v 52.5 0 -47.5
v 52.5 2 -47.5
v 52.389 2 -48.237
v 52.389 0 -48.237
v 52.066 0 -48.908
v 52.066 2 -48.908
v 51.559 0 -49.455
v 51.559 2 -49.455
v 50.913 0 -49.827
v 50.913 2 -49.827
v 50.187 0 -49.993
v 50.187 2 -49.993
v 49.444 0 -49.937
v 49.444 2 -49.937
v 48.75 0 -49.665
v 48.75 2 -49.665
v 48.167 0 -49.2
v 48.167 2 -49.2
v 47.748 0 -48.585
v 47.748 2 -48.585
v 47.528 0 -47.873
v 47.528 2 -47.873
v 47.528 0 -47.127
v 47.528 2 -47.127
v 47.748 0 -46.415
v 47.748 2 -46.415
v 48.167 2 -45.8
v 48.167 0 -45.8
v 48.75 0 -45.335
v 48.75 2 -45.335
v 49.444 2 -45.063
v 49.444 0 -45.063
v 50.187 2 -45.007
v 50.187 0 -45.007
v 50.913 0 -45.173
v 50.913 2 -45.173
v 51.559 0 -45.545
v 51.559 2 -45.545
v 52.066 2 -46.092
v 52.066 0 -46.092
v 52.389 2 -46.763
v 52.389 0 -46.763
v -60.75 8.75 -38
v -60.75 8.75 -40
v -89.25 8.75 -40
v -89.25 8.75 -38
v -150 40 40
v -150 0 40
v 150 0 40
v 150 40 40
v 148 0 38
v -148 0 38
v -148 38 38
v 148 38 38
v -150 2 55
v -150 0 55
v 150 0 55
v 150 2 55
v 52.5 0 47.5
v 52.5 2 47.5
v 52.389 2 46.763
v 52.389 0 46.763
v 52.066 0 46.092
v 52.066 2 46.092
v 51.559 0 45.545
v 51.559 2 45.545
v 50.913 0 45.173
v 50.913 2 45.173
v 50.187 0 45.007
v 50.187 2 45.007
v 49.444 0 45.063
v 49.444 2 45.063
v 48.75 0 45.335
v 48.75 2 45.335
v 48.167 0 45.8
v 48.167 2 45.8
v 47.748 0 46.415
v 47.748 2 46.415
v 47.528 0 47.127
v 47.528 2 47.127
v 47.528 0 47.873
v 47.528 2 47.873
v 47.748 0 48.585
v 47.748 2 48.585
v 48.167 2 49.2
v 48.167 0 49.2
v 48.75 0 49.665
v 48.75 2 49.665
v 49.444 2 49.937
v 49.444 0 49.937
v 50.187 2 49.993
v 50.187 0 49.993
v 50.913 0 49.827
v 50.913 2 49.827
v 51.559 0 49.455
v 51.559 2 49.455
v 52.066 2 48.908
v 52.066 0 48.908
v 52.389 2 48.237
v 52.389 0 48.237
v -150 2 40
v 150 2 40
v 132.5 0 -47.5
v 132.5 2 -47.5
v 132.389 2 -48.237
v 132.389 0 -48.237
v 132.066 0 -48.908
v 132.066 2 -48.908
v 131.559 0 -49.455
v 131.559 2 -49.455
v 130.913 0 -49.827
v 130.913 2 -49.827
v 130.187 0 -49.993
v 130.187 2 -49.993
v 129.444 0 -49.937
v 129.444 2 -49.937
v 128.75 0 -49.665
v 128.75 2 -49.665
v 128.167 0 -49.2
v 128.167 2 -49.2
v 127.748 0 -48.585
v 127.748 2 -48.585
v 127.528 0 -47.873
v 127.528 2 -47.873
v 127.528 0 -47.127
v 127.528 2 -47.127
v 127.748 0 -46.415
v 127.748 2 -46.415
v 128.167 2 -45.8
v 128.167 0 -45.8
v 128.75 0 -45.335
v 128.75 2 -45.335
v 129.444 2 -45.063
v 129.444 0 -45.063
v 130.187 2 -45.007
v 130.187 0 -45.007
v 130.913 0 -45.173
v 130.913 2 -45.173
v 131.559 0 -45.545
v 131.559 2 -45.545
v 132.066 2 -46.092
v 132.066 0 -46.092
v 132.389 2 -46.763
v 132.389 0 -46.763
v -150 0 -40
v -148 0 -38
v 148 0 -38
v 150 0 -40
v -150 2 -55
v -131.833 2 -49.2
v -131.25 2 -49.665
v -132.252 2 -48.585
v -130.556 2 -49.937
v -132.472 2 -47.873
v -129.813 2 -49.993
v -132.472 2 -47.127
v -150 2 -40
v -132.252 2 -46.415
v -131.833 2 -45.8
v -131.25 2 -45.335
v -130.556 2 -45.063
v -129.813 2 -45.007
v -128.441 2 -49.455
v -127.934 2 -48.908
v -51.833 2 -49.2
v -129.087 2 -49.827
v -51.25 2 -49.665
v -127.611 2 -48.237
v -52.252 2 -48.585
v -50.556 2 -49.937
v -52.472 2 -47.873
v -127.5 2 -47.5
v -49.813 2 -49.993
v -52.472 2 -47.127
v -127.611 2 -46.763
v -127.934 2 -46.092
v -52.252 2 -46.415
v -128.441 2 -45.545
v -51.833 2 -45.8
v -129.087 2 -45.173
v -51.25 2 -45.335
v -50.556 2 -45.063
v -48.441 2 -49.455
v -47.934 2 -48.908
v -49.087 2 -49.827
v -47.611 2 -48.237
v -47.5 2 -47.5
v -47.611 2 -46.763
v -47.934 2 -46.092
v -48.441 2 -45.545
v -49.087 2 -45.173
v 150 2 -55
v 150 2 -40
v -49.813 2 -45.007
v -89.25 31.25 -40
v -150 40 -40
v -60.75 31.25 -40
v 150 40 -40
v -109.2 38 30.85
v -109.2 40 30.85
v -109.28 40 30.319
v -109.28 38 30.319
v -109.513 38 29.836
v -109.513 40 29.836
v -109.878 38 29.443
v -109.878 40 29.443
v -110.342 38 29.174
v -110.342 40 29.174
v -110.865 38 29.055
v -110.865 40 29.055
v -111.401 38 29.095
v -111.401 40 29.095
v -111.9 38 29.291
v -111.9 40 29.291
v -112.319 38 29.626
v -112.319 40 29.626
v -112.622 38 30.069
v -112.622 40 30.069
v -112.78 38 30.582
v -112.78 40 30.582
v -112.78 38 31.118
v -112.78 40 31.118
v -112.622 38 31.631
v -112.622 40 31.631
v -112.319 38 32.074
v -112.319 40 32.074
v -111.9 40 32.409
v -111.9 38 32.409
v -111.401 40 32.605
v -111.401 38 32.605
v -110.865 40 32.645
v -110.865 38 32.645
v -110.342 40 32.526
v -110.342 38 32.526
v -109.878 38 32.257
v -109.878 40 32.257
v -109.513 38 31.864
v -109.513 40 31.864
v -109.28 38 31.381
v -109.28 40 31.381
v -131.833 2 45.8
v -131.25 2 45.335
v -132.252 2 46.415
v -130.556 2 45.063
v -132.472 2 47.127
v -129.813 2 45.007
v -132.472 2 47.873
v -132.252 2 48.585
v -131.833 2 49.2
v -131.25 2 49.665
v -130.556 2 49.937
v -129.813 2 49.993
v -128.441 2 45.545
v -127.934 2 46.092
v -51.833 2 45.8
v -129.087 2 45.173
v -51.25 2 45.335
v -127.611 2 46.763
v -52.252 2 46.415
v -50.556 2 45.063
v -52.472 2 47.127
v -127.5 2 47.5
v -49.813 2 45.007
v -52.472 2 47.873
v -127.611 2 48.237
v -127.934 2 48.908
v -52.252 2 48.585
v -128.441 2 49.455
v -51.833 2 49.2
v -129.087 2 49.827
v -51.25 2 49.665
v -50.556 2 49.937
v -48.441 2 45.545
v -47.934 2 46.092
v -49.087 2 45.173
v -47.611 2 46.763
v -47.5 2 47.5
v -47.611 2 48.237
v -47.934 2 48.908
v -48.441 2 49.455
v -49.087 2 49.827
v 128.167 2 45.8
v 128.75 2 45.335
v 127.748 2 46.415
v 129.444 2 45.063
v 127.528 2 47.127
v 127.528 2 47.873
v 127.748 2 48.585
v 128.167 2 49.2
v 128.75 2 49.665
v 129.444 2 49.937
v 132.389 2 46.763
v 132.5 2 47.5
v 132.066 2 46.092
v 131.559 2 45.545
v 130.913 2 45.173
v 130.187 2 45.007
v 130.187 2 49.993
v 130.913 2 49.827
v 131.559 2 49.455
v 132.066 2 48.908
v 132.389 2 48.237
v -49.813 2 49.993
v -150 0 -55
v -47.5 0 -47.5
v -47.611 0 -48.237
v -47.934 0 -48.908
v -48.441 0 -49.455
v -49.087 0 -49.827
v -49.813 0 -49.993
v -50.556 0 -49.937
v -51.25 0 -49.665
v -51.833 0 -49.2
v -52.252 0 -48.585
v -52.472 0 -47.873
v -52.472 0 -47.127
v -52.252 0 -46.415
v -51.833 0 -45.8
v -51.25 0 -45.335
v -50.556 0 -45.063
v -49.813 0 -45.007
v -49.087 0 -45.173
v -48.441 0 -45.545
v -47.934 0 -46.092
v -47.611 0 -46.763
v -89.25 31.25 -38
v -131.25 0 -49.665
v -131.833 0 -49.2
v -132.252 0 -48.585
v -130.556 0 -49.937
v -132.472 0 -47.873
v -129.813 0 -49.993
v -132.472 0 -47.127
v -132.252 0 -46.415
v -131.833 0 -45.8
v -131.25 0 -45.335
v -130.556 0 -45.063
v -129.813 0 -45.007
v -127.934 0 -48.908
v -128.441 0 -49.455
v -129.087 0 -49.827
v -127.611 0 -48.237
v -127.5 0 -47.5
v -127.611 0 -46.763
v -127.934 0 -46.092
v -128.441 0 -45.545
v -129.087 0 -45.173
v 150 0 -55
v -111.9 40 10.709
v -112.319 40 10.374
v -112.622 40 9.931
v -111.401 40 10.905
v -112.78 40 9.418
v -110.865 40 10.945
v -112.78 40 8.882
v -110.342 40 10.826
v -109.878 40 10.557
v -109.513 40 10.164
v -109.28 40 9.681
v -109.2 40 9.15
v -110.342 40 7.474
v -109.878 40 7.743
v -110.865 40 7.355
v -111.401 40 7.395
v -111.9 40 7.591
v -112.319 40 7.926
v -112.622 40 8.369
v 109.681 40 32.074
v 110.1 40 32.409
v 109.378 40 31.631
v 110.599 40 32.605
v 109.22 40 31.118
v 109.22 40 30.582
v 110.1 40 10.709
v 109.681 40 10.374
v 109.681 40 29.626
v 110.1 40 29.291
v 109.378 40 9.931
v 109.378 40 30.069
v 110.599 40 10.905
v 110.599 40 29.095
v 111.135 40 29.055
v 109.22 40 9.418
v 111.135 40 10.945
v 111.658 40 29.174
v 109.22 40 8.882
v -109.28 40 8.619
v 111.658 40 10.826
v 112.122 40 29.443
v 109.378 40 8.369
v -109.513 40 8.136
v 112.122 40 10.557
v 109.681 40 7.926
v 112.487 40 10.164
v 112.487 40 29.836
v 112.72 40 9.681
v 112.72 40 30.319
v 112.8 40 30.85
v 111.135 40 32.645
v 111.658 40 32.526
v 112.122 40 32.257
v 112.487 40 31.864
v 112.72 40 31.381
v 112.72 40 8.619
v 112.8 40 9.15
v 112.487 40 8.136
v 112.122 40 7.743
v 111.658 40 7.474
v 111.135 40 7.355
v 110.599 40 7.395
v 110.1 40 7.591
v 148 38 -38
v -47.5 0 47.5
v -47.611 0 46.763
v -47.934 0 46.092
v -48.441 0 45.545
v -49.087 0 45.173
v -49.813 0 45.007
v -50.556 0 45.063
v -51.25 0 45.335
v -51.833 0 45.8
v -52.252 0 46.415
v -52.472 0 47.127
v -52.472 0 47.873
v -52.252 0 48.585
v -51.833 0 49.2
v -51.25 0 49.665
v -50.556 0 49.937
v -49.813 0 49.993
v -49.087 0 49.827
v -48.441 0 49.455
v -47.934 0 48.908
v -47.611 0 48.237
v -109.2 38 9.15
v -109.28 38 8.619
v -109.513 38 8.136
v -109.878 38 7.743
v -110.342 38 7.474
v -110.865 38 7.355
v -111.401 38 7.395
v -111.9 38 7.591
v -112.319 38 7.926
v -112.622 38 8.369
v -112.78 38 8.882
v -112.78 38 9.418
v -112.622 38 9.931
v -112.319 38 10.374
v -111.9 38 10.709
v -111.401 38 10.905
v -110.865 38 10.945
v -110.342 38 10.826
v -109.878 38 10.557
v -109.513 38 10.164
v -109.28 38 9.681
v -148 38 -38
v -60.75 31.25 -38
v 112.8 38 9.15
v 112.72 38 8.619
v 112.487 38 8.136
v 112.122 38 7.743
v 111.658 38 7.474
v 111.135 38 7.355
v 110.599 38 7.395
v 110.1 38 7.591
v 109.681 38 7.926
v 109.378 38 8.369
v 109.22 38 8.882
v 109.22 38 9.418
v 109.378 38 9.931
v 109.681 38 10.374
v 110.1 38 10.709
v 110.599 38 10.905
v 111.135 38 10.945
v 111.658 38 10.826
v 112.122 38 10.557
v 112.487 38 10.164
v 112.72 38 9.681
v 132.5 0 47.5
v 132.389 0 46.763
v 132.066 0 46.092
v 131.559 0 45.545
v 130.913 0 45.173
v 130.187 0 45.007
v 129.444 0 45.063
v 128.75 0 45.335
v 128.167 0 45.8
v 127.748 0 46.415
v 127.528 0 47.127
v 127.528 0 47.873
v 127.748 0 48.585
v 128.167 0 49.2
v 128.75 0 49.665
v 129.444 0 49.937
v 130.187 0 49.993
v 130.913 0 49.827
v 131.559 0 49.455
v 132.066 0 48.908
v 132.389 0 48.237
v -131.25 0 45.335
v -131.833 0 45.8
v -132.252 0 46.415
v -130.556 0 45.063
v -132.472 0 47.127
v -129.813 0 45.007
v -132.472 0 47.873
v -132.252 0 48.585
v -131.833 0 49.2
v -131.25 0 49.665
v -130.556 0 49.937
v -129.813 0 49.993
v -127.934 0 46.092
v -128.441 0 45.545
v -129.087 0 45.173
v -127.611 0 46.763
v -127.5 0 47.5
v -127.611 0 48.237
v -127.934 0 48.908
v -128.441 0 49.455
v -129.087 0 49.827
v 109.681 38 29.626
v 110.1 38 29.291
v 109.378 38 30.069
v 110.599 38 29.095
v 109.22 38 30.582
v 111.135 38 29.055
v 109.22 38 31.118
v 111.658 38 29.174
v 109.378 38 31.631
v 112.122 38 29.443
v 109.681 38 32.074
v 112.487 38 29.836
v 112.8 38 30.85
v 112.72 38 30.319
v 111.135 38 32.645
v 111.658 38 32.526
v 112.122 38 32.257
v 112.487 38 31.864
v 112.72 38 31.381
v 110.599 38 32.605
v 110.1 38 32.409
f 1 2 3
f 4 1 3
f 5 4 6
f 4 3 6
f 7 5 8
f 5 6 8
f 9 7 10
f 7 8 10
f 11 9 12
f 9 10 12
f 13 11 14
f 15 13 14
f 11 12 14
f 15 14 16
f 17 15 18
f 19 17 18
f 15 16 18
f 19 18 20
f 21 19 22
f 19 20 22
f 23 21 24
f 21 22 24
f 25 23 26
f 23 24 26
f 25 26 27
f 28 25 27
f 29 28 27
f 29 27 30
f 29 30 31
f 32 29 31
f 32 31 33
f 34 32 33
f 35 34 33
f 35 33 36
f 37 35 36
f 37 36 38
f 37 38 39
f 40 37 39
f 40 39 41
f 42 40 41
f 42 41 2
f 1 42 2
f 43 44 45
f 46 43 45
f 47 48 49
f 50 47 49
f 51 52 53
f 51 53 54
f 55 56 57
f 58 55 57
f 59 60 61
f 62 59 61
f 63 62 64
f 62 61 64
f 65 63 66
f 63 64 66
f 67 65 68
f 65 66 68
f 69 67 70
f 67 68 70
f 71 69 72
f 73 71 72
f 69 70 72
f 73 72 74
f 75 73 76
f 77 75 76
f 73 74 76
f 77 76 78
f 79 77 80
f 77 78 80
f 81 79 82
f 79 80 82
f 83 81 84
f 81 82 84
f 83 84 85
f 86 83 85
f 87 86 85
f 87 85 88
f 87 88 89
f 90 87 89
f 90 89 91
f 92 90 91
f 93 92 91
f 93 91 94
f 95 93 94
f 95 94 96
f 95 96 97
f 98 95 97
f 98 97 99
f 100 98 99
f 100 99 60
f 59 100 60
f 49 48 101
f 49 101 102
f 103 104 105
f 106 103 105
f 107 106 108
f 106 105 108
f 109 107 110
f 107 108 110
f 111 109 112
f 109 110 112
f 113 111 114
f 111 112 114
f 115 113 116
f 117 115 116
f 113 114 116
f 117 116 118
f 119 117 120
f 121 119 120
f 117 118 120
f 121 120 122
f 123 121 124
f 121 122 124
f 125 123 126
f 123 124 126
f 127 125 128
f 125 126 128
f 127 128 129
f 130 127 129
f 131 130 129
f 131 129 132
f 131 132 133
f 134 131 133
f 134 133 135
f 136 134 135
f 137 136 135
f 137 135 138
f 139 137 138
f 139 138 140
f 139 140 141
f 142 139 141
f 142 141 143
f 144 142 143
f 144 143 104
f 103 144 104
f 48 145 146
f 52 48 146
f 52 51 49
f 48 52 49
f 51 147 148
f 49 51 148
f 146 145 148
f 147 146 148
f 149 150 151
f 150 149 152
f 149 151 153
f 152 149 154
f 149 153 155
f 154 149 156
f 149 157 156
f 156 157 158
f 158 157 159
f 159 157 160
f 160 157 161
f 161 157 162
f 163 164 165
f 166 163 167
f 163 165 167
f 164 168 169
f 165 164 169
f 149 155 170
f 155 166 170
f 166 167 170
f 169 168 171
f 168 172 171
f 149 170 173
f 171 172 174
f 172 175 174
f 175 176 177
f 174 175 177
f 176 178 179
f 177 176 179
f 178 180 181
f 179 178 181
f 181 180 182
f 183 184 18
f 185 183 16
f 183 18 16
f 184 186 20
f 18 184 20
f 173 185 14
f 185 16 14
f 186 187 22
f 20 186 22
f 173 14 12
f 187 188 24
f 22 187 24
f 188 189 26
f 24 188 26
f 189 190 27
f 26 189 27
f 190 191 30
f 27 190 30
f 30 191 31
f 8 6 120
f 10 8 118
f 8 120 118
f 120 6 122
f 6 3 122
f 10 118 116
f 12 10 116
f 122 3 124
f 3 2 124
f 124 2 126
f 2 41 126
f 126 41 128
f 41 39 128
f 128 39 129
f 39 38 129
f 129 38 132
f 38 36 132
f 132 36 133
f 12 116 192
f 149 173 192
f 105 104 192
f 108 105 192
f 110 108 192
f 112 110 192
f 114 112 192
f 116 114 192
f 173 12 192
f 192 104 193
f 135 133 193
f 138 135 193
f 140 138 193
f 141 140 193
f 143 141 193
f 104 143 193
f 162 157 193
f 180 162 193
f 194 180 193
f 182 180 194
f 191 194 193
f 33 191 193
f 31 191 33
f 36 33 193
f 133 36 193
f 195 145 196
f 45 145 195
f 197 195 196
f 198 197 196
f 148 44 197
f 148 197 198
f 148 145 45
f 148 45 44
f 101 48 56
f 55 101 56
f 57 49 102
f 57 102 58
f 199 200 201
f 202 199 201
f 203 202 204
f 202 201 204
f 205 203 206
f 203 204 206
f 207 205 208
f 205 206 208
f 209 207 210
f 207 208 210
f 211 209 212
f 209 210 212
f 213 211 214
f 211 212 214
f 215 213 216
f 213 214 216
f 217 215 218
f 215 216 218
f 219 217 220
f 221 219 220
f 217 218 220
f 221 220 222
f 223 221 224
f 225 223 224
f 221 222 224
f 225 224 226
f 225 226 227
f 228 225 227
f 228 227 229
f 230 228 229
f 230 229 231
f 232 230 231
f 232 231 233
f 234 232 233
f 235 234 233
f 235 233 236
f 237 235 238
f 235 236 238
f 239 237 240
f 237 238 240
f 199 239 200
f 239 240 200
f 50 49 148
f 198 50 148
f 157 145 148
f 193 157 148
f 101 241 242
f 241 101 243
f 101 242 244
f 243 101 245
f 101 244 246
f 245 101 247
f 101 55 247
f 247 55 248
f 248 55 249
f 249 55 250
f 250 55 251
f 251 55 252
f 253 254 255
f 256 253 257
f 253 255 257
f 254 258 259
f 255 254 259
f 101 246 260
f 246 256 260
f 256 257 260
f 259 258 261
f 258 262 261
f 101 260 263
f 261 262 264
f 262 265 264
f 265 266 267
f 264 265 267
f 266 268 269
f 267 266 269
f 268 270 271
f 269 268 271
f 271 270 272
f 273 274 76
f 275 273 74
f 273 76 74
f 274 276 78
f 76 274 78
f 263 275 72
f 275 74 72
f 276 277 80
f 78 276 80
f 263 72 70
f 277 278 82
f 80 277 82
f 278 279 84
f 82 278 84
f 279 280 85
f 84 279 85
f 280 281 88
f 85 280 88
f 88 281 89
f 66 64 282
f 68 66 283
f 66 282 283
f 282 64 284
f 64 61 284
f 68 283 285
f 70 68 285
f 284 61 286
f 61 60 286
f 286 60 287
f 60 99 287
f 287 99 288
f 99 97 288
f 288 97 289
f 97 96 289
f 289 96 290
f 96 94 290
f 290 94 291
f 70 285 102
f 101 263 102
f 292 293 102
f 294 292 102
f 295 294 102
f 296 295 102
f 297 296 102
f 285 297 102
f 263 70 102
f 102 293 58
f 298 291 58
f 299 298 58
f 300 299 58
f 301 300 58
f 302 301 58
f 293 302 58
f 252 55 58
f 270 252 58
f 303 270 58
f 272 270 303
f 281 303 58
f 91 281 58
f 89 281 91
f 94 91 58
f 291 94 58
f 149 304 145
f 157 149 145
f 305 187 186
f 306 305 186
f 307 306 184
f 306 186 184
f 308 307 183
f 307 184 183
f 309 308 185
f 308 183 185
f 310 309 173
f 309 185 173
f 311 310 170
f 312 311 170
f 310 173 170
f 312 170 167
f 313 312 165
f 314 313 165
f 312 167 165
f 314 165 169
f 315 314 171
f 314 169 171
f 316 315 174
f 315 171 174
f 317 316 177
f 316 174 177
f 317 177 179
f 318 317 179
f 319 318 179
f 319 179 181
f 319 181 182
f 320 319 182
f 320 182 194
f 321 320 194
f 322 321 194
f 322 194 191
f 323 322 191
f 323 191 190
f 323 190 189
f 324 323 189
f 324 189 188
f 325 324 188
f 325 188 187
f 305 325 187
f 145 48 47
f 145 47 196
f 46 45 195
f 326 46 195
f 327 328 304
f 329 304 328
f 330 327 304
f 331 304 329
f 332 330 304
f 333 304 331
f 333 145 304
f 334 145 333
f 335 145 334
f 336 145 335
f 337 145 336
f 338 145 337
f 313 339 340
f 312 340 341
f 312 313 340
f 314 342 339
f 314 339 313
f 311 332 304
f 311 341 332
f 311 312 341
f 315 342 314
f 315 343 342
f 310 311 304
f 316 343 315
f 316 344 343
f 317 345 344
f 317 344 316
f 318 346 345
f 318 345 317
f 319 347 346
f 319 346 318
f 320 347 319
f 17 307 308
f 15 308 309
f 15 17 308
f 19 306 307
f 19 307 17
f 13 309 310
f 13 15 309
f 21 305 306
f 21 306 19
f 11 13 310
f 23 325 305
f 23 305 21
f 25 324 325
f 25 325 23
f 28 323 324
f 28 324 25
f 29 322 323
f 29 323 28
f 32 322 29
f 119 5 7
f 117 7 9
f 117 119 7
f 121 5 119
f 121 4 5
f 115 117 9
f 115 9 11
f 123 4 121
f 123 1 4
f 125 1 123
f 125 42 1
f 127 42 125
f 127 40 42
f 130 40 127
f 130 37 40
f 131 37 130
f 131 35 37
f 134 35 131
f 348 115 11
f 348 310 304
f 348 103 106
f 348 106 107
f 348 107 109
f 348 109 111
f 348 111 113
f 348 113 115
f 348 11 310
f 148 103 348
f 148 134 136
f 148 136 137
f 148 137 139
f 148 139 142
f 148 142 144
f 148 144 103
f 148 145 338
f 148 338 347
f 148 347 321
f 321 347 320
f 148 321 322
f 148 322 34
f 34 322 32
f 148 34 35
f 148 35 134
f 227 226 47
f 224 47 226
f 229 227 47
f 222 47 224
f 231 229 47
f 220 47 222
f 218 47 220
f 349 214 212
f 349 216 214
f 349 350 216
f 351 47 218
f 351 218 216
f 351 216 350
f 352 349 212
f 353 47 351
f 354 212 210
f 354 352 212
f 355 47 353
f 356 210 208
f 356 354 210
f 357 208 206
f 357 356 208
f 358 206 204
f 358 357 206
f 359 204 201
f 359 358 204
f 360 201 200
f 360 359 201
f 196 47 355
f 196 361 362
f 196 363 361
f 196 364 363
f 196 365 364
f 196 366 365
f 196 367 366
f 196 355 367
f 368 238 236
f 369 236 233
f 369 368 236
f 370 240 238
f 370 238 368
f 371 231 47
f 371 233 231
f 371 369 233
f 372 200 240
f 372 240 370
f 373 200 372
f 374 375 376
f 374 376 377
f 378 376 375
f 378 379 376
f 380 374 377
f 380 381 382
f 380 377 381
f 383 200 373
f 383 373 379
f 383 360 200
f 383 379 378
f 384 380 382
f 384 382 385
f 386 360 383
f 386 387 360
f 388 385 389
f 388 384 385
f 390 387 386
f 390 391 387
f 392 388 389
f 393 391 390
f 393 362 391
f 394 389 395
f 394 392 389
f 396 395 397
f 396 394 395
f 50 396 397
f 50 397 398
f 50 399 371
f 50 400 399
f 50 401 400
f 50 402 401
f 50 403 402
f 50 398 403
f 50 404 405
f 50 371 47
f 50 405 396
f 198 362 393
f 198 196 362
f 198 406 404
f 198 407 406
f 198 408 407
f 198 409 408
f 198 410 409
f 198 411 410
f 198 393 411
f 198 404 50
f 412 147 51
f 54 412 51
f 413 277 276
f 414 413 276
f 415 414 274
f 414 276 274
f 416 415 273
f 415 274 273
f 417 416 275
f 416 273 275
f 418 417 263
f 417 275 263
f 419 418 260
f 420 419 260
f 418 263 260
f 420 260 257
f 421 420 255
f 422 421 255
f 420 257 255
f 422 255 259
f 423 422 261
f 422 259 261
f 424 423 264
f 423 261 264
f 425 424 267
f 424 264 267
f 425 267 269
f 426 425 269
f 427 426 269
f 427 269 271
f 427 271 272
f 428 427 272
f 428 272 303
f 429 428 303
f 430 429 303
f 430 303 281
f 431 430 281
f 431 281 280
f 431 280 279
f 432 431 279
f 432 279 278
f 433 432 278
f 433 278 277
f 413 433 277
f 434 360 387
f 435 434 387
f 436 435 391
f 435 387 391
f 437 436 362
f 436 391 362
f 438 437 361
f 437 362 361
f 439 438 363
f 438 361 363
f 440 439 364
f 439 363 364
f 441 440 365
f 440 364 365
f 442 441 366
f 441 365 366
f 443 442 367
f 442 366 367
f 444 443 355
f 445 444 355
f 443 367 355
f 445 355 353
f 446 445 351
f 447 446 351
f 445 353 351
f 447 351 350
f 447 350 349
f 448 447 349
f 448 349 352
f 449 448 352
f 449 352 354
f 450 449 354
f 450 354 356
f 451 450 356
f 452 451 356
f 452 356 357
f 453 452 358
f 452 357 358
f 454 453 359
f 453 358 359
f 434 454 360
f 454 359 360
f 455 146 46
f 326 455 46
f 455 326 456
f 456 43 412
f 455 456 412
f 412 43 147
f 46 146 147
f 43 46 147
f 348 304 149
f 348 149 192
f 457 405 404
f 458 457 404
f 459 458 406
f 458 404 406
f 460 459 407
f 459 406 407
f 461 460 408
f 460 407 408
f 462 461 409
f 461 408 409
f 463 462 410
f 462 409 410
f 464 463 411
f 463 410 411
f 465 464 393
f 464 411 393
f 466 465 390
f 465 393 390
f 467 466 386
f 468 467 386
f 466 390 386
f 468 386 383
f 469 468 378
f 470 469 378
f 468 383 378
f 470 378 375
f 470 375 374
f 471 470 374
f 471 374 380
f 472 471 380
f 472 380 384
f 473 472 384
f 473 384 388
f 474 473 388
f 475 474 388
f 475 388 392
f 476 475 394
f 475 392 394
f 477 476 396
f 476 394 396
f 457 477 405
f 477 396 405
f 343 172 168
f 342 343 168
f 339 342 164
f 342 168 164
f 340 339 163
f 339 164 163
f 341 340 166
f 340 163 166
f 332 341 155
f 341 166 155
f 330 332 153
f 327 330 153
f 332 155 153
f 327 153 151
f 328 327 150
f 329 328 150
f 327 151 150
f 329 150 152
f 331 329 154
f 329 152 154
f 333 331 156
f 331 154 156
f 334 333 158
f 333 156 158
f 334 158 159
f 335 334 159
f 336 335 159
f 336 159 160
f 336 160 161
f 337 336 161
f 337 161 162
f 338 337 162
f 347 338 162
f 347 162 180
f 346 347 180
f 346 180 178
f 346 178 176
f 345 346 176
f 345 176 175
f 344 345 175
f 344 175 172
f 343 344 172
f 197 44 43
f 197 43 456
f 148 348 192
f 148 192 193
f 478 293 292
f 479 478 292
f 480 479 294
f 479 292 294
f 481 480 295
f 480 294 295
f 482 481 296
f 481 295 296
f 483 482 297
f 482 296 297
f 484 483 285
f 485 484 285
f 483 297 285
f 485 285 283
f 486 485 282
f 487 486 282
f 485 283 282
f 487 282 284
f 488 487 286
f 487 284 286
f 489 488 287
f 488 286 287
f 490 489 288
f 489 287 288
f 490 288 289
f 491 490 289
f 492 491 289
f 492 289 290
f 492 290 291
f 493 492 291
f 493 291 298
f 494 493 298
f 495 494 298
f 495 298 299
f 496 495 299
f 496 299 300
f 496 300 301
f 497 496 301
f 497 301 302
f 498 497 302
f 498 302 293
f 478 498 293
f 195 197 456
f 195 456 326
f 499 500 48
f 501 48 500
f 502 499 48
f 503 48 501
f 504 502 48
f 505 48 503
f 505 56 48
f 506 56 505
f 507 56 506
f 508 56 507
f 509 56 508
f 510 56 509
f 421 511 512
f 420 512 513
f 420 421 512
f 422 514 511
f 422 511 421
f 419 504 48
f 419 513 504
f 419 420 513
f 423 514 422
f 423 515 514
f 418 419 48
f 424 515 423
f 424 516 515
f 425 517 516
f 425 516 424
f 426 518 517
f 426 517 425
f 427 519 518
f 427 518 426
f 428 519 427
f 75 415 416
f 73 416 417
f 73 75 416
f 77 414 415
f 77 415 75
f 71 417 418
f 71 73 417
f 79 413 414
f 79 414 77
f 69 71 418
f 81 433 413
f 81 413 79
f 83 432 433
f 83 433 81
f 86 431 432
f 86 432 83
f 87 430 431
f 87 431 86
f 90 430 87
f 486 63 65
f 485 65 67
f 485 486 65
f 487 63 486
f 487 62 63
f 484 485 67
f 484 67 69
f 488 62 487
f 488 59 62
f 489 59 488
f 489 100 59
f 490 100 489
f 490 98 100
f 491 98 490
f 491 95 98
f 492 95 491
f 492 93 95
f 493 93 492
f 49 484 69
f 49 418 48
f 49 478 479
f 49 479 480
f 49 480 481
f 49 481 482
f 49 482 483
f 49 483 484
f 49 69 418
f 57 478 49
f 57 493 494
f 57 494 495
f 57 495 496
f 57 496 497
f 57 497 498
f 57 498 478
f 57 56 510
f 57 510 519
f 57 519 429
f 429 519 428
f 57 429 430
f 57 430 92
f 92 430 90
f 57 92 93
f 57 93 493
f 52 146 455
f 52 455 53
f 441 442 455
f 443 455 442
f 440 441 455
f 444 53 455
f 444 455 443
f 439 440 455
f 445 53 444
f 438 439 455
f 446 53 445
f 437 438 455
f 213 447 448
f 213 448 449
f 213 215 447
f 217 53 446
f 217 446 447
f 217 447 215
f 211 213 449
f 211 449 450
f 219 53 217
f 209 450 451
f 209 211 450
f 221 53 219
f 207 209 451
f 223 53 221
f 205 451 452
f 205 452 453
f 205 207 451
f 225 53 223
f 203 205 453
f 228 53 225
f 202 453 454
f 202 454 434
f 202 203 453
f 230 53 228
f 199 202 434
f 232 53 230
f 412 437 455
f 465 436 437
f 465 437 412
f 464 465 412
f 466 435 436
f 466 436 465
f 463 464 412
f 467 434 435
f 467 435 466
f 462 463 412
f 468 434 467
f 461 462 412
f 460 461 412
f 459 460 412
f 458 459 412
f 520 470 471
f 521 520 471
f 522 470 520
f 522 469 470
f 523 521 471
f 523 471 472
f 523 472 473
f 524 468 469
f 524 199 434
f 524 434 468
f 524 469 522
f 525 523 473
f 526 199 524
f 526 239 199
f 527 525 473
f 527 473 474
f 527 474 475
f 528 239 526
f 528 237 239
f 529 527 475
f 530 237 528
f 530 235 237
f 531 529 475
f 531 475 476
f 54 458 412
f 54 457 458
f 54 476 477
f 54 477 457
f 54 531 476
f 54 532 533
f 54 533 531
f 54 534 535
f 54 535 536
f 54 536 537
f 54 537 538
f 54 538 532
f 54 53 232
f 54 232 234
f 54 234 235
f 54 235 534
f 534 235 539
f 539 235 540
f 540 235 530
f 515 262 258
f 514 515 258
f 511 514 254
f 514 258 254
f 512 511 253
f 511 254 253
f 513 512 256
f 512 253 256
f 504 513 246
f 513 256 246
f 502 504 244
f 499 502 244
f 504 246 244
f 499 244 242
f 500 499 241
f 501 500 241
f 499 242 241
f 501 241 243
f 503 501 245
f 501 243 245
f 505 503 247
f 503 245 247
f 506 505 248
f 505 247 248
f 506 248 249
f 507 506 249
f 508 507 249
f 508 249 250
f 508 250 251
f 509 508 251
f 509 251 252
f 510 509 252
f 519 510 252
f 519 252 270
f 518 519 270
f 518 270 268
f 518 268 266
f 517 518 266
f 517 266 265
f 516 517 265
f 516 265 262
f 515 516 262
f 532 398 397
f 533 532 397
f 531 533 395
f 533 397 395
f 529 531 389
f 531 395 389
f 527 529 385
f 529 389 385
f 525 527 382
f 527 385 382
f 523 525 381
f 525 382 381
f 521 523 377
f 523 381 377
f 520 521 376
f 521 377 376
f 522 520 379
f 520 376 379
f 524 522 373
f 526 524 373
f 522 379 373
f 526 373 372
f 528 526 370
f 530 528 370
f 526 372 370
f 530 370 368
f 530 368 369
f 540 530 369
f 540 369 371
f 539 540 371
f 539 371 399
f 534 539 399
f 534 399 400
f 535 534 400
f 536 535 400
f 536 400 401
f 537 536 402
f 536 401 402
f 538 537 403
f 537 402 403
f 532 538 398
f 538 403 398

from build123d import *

# Parameters (mm, degrees)
ESBO_O1_W                  = 300
ESBO_O1_H                  = 80
RESSALTO_EXTRUS_O1_DEPTH   = 40
ESBO_O2_W                  = 296
ESBO_O2_H                  = 76
CORTE_EXTRUS_O1_DEPTH      = 38
ESBO_O3_W                  = 300
ESBO_O3_H                  = 15
RESSALTO_EXTRUS_O2_DEPTH   = 2
RESSALTO_EXTRUS_O2_2_DEPTH = 2
ESBO_O4_R                  = 2.5
CORTE_EXTRUS_O2_DEPTH      = 3
ESBO_O5_R                  = 1.8
CORTE_EXTRUS_O3_DEPTH      = 2
ESBO_O6_W                  = 28.5
ESBO_O6_H                  = 22.5
CORTE_EXTRUS_O4_DEPTH      = 2


with BuildPart() as part:
    # Esboço1 → Ressalto-extrusão1 (new body)
    with BuildSketch(Plane(origin=(0, 0, 0), x_dir=(1, 0, 0), z_dir=(0, 1, 0))):
        Rectangle(ESBO_O1_W, ESBO_O1_H)
    extrude(amount=RESSALTO_EXTRUS_O1_DEPTH)

    # Esboço2 → Corte-extrusão1 (cut)
    with BuildSketch(Plane.XZ):
        Rectangle(ESBO_O2_W, ESBO_O2_H)
    extrude(amount=-CORTE_EXTRUS_O1_DEPTH, mode=Mode.SUBTRACT)

    # Esboço5 → Corte-extrusão3 (cut)
    with BuildSketch(Plane(origin=(0, 40, 0), x_dir=(1, 0, 0), z_dir=(0, 1, 0))):
        with Locations((-111, -9.15)):
            Circle(ESBO_O5_R)
        with Locations((111, -9.15)):
            Circle(ESBO_O5_R)
        with Locations((111, -30.85)):
            Circle(ESBO_O5_R)
        with Locations((-111, -30.85)):
            Circle(ESBO_O5_R)
    extrude(amount=-CORTE_EXTRUS_O3_DEPTH, mode=Mode.SUBTRACT)

    # Esboço6 → Corte-extrusão4 (cut)
    with BuildSketch(Plane(origin=(0, 0, -40), x_dir=(-1, 0, 0), z_dir=(0, 0, -1))):
        with Locations((75, 20)):
            Rectangle(ESBO_O6_W, ESBO_O6_H)
    extrude(amount=-CORTE_EXTRUS_O4_DEPTH, mode=Mode.SUBTRACT)


with BuildPart() as body_2:
    # Esboço3 → Ressalto-extrusão2 (new body)
    with BuildSketch(Plane.XZ):
        with Locations((0, 47.5)):
            Rectangle(ESBO_O3_W, ESBO_O3_H)
    extrude(amount=-RESSALTO_EXTRUS_O2_DEPTH)


with BuildPart() as body_3:
    # Esboço3 → Ressalto-extrus_o2 2 (new body)
    with BuildSketch(Plane.XZ):
        with Locations((0, -47.5)):
            Rectangle(ESBO_O3_W, ESBO_O3_H)
    extrude(amount=-RESSALTO_EXTRUS_O2_2_DEPTH)


with BuildPart() as corte_extrus_o2_tool:
    # Esboço4 → Corte-extrusão2 (new body, through all)
    with BuildSketch(Plane(origin=(0, 2, 0), x_dir=(1, 0, 0), z_dir=(0, 1, 0))):
        with Locations((-130, -47.5)):
            Circle(ESBO_O4_R)
        with Locations((-50, -47.5)):
            Circle(ESBO_O4_R)
        with Locations((50, -47.5)):
            Circle(ESBO_O4_R)
        with Locations((130, -47.5)):
            Circle(ESBO_O4_R)
        with Locations((130, 47.5)):
            Circle(ESBO_O4_R)
        with Locations((50, 47.5)):
            Circle(ESBO_O4_R)
        with Locations((-50, 47.5)):
            Circle(ESBO_O4_R)
        with Locations((-130, 47.5)):
            Circle(ESBO_O4_R)
    extrude(amount=-CORTE_EXTRUS_O2_DEPTH)


with BuildPart() as body_2_1:
    add(body_2.part)

    # Corte-extrusão2: cut by corte_extrus_o2_tool
    add(corte_extrus_o2_tool.part, mode=Mode.SUBTRACT)


with BuildPart() as body_3_1:
    add(body_3.part)

    # Corte-extrusão2: cut by corte_extrus_o2_tool
    add(corte_extrus_o2_tool.part, mode=Mode.SUBTRACT)


solid = Compound([part.part, body_2_1.part, body_3_1.part])
